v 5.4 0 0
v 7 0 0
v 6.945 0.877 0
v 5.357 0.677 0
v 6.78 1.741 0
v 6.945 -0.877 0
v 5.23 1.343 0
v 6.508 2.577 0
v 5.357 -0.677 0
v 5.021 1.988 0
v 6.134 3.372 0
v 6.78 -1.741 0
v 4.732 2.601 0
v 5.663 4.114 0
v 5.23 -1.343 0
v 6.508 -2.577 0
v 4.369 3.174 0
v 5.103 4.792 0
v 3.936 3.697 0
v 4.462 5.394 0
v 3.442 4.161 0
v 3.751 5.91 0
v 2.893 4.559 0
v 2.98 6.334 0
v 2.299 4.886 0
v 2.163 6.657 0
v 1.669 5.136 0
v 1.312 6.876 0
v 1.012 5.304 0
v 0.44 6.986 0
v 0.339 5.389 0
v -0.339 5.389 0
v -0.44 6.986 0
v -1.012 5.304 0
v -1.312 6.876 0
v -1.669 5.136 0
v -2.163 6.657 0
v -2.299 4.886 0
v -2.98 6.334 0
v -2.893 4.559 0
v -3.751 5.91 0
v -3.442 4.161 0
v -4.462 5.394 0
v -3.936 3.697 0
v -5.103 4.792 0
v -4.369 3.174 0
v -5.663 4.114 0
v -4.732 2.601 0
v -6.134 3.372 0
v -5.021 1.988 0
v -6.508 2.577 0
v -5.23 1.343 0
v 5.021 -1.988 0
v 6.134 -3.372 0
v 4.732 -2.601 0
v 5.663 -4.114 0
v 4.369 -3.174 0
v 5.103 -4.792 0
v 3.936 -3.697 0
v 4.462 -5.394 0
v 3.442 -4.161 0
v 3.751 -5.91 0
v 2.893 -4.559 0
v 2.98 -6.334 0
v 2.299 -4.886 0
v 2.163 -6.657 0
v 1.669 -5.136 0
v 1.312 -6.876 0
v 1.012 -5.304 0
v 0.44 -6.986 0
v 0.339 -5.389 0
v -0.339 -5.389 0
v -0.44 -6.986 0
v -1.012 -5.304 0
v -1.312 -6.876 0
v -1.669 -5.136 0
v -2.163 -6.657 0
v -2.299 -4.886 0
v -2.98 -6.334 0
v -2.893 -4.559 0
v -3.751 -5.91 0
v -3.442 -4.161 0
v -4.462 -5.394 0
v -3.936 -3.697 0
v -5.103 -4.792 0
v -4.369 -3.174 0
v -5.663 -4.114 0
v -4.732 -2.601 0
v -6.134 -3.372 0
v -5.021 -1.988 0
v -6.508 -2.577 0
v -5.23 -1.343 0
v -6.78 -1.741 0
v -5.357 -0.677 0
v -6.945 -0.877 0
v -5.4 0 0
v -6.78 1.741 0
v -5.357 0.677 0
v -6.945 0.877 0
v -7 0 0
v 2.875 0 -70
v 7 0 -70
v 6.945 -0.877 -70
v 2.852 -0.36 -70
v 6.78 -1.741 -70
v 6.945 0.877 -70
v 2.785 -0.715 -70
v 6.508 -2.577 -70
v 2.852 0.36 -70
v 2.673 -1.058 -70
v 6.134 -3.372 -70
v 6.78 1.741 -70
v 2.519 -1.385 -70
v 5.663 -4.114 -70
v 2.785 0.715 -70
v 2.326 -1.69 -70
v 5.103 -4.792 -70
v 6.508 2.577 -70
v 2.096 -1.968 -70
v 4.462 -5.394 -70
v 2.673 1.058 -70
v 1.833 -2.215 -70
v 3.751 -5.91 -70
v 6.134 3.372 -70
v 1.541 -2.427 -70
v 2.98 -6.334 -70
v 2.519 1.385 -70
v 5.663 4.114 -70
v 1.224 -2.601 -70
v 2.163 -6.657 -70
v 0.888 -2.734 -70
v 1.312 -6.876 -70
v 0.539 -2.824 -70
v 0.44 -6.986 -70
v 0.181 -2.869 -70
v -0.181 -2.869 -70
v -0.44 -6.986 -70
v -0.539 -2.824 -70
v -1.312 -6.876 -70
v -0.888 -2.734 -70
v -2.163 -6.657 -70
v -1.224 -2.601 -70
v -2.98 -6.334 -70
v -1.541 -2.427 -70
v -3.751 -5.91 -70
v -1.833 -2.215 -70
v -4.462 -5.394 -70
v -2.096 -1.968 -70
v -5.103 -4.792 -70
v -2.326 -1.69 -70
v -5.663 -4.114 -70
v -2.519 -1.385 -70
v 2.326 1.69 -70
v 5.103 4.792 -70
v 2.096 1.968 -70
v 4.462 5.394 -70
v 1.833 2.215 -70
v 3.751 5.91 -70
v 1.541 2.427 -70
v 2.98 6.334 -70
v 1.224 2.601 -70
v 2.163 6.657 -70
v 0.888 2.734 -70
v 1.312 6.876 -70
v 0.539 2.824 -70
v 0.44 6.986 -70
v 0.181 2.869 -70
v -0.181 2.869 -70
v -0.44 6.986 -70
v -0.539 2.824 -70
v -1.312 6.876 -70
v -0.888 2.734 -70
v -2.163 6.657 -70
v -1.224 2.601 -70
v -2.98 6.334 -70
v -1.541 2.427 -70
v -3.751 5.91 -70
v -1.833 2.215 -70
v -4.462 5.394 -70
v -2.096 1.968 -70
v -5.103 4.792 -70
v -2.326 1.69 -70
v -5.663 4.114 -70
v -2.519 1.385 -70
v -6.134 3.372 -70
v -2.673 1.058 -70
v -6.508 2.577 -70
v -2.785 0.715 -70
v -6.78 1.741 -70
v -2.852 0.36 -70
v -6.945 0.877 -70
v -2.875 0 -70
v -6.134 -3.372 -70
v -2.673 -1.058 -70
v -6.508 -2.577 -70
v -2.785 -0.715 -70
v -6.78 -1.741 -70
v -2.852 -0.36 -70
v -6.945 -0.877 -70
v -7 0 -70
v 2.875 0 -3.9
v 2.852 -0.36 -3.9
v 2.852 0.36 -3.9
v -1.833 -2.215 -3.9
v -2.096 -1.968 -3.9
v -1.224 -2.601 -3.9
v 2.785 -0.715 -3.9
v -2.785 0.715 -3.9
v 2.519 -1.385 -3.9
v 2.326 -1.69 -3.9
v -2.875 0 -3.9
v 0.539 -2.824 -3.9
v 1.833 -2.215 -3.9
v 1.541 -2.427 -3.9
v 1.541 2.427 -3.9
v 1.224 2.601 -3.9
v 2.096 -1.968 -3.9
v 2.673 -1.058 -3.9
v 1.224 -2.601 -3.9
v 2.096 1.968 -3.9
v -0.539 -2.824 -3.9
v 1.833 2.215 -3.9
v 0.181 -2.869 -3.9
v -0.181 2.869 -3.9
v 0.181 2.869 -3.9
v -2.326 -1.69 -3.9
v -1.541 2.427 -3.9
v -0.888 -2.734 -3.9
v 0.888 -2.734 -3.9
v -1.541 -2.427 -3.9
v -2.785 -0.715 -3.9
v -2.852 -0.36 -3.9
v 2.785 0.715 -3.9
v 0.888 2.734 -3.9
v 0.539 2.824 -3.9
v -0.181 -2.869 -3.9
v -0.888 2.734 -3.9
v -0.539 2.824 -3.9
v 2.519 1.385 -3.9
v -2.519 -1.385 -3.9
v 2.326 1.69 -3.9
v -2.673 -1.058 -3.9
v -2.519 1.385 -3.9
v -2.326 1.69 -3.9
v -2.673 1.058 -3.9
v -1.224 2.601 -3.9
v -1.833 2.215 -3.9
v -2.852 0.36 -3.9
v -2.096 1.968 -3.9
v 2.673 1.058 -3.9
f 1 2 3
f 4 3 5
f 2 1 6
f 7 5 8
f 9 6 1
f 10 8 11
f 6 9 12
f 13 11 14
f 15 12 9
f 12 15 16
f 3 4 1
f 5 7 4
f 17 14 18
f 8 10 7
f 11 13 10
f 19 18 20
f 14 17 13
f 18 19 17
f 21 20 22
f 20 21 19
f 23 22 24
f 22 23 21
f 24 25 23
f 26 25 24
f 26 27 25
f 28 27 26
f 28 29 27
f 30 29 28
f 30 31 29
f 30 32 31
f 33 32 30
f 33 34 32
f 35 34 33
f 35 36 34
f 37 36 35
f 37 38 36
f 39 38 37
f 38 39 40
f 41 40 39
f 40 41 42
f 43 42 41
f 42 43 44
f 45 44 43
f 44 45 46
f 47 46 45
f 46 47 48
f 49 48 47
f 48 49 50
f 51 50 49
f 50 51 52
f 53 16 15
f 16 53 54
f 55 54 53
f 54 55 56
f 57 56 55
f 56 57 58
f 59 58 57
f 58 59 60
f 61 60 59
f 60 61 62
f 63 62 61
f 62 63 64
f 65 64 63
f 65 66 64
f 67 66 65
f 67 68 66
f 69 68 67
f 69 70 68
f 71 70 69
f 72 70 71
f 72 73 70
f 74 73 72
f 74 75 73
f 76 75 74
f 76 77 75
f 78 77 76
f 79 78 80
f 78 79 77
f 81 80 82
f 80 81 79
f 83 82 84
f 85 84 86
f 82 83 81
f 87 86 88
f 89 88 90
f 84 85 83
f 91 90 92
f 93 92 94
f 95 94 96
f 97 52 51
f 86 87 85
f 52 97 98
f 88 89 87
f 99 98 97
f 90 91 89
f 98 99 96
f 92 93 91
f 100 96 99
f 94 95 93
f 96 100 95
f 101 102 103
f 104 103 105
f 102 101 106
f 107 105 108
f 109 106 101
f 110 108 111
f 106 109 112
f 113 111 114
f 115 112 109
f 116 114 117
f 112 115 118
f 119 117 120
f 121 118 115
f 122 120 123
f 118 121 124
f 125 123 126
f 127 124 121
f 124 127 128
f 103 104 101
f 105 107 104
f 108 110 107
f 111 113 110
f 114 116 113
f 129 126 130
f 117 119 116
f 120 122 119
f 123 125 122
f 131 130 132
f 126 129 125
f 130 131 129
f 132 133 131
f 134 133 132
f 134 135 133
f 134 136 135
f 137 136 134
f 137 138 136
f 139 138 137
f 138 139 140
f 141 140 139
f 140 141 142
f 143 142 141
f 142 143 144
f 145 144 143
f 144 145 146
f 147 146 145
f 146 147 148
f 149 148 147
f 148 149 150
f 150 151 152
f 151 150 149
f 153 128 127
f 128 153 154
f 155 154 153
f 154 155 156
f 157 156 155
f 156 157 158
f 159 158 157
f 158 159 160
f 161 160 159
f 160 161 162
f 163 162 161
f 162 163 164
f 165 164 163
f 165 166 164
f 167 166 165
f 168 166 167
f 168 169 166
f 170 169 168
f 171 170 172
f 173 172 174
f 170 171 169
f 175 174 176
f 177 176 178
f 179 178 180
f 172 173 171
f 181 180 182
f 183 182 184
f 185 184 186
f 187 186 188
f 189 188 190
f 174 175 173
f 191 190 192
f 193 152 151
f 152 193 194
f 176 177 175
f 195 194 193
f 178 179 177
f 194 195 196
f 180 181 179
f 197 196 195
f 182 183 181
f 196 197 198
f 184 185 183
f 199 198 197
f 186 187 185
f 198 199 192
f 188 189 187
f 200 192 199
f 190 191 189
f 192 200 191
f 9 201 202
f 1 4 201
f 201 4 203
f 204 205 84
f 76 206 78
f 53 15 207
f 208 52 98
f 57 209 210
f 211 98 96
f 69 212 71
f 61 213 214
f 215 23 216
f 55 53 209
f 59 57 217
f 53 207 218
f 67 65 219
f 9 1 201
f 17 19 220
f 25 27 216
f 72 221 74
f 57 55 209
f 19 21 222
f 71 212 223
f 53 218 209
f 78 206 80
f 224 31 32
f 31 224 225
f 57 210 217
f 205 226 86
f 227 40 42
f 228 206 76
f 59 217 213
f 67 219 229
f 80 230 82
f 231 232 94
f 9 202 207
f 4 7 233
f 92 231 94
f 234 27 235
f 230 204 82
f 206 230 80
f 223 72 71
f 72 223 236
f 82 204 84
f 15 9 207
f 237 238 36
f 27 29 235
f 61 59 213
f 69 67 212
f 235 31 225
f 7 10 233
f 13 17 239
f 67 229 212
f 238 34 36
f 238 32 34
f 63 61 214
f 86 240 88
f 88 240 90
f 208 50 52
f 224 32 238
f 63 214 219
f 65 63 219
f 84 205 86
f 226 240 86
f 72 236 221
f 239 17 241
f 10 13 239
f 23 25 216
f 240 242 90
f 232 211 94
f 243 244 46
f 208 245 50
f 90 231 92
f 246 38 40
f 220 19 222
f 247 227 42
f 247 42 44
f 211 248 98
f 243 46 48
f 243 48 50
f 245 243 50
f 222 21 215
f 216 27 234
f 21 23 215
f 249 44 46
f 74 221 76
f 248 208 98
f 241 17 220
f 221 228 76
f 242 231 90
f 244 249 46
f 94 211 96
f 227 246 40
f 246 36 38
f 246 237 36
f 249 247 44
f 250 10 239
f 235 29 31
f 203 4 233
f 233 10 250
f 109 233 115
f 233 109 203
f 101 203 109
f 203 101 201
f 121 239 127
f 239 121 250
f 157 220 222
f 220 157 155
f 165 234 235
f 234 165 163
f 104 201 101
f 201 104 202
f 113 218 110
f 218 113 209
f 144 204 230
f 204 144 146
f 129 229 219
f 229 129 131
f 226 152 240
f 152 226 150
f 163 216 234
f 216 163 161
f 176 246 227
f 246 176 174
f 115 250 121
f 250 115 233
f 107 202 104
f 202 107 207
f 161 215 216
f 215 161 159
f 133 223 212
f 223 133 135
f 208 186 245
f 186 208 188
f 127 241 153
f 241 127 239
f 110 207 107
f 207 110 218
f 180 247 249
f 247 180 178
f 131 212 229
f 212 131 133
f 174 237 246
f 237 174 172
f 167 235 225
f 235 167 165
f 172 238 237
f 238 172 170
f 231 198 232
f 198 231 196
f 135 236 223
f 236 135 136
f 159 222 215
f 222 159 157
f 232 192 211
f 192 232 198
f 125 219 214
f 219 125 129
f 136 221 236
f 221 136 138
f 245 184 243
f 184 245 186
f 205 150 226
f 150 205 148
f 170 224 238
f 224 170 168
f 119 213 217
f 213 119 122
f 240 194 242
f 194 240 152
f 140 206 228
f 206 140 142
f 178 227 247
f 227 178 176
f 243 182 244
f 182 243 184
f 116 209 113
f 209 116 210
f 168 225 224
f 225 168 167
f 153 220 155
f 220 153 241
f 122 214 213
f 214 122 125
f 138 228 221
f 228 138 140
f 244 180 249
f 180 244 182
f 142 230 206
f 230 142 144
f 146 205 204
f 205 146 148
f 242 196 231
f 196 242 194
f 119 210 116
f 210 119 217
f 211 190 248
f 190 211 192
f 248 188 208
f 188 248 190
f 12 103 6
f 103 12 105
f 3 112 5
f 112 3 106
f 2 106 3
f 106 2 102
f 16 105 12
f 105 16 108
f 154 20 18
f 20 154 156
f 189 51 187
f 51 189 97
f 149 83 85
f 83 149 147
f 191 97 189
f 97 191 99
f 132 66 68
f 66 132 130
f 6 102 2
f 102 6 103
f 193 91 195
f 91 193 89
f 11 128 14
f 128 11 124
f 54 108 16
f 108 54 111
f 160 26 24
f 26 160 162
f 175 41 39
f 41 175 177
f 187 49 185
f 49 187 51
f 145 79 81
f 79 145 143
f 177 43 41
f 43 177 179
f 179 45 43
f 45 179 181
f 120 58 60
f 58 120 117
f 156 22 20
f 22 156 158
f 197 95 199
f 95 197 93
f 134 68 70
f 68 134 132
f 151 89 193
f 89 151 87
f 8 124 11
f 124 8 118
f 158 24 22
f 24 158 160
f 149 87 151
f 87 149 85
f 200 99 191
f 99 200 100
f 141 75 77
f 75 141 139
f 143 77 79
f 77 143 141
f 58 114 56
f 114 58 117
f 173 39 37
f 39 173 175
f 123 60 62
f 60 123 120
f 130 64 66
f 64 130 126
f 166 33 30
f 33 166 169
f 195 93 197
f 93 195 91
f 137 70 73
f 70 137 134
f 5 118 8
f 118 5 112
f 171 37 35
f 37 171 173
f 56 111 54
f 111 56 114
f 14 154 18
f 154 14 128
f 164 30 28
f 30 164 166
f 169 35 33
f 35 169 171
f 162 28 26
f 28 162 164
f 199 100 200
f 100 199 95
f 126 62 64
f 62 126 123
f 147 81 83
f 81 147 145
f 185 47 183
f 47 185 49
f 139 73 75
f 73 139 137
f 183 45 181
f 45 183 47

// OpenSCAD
$fn = 50;


difference() {
	union() {
		translate(v = [0, 0, -70.0000000000]) {
			cylinder(h = 70, r = 7.0000000000);
		}
		cylinder(h = 0, r = 17.0000000000);
	}
	union() {
		translate(v = [0, 0, 0]) {
			rotate(a = [0, 0, 0]) {
				difference() {
					union() {
						#translate(v = [0, 0, -70.0000000000]) {
							cylinder(h = 70, r = 2.6000000000);
						}
						#translate(v = [0, 0, -3.9000000000]) {
							cylinder(h = 3.9000000000, r1 = 2.8750000000, r2 = 5.4000000000);
						}
						#translate(v = [0, 0, -70.0000000000]) {
							cylinder(h = 70, r = 2.8750000000);
						}
						#translate(v = [0, 0, -70.0000000000]) {
							cylinder(h = 70, r = 2.6000000000);
						}
					}
					union();
				}
			}
		}
	}
}
